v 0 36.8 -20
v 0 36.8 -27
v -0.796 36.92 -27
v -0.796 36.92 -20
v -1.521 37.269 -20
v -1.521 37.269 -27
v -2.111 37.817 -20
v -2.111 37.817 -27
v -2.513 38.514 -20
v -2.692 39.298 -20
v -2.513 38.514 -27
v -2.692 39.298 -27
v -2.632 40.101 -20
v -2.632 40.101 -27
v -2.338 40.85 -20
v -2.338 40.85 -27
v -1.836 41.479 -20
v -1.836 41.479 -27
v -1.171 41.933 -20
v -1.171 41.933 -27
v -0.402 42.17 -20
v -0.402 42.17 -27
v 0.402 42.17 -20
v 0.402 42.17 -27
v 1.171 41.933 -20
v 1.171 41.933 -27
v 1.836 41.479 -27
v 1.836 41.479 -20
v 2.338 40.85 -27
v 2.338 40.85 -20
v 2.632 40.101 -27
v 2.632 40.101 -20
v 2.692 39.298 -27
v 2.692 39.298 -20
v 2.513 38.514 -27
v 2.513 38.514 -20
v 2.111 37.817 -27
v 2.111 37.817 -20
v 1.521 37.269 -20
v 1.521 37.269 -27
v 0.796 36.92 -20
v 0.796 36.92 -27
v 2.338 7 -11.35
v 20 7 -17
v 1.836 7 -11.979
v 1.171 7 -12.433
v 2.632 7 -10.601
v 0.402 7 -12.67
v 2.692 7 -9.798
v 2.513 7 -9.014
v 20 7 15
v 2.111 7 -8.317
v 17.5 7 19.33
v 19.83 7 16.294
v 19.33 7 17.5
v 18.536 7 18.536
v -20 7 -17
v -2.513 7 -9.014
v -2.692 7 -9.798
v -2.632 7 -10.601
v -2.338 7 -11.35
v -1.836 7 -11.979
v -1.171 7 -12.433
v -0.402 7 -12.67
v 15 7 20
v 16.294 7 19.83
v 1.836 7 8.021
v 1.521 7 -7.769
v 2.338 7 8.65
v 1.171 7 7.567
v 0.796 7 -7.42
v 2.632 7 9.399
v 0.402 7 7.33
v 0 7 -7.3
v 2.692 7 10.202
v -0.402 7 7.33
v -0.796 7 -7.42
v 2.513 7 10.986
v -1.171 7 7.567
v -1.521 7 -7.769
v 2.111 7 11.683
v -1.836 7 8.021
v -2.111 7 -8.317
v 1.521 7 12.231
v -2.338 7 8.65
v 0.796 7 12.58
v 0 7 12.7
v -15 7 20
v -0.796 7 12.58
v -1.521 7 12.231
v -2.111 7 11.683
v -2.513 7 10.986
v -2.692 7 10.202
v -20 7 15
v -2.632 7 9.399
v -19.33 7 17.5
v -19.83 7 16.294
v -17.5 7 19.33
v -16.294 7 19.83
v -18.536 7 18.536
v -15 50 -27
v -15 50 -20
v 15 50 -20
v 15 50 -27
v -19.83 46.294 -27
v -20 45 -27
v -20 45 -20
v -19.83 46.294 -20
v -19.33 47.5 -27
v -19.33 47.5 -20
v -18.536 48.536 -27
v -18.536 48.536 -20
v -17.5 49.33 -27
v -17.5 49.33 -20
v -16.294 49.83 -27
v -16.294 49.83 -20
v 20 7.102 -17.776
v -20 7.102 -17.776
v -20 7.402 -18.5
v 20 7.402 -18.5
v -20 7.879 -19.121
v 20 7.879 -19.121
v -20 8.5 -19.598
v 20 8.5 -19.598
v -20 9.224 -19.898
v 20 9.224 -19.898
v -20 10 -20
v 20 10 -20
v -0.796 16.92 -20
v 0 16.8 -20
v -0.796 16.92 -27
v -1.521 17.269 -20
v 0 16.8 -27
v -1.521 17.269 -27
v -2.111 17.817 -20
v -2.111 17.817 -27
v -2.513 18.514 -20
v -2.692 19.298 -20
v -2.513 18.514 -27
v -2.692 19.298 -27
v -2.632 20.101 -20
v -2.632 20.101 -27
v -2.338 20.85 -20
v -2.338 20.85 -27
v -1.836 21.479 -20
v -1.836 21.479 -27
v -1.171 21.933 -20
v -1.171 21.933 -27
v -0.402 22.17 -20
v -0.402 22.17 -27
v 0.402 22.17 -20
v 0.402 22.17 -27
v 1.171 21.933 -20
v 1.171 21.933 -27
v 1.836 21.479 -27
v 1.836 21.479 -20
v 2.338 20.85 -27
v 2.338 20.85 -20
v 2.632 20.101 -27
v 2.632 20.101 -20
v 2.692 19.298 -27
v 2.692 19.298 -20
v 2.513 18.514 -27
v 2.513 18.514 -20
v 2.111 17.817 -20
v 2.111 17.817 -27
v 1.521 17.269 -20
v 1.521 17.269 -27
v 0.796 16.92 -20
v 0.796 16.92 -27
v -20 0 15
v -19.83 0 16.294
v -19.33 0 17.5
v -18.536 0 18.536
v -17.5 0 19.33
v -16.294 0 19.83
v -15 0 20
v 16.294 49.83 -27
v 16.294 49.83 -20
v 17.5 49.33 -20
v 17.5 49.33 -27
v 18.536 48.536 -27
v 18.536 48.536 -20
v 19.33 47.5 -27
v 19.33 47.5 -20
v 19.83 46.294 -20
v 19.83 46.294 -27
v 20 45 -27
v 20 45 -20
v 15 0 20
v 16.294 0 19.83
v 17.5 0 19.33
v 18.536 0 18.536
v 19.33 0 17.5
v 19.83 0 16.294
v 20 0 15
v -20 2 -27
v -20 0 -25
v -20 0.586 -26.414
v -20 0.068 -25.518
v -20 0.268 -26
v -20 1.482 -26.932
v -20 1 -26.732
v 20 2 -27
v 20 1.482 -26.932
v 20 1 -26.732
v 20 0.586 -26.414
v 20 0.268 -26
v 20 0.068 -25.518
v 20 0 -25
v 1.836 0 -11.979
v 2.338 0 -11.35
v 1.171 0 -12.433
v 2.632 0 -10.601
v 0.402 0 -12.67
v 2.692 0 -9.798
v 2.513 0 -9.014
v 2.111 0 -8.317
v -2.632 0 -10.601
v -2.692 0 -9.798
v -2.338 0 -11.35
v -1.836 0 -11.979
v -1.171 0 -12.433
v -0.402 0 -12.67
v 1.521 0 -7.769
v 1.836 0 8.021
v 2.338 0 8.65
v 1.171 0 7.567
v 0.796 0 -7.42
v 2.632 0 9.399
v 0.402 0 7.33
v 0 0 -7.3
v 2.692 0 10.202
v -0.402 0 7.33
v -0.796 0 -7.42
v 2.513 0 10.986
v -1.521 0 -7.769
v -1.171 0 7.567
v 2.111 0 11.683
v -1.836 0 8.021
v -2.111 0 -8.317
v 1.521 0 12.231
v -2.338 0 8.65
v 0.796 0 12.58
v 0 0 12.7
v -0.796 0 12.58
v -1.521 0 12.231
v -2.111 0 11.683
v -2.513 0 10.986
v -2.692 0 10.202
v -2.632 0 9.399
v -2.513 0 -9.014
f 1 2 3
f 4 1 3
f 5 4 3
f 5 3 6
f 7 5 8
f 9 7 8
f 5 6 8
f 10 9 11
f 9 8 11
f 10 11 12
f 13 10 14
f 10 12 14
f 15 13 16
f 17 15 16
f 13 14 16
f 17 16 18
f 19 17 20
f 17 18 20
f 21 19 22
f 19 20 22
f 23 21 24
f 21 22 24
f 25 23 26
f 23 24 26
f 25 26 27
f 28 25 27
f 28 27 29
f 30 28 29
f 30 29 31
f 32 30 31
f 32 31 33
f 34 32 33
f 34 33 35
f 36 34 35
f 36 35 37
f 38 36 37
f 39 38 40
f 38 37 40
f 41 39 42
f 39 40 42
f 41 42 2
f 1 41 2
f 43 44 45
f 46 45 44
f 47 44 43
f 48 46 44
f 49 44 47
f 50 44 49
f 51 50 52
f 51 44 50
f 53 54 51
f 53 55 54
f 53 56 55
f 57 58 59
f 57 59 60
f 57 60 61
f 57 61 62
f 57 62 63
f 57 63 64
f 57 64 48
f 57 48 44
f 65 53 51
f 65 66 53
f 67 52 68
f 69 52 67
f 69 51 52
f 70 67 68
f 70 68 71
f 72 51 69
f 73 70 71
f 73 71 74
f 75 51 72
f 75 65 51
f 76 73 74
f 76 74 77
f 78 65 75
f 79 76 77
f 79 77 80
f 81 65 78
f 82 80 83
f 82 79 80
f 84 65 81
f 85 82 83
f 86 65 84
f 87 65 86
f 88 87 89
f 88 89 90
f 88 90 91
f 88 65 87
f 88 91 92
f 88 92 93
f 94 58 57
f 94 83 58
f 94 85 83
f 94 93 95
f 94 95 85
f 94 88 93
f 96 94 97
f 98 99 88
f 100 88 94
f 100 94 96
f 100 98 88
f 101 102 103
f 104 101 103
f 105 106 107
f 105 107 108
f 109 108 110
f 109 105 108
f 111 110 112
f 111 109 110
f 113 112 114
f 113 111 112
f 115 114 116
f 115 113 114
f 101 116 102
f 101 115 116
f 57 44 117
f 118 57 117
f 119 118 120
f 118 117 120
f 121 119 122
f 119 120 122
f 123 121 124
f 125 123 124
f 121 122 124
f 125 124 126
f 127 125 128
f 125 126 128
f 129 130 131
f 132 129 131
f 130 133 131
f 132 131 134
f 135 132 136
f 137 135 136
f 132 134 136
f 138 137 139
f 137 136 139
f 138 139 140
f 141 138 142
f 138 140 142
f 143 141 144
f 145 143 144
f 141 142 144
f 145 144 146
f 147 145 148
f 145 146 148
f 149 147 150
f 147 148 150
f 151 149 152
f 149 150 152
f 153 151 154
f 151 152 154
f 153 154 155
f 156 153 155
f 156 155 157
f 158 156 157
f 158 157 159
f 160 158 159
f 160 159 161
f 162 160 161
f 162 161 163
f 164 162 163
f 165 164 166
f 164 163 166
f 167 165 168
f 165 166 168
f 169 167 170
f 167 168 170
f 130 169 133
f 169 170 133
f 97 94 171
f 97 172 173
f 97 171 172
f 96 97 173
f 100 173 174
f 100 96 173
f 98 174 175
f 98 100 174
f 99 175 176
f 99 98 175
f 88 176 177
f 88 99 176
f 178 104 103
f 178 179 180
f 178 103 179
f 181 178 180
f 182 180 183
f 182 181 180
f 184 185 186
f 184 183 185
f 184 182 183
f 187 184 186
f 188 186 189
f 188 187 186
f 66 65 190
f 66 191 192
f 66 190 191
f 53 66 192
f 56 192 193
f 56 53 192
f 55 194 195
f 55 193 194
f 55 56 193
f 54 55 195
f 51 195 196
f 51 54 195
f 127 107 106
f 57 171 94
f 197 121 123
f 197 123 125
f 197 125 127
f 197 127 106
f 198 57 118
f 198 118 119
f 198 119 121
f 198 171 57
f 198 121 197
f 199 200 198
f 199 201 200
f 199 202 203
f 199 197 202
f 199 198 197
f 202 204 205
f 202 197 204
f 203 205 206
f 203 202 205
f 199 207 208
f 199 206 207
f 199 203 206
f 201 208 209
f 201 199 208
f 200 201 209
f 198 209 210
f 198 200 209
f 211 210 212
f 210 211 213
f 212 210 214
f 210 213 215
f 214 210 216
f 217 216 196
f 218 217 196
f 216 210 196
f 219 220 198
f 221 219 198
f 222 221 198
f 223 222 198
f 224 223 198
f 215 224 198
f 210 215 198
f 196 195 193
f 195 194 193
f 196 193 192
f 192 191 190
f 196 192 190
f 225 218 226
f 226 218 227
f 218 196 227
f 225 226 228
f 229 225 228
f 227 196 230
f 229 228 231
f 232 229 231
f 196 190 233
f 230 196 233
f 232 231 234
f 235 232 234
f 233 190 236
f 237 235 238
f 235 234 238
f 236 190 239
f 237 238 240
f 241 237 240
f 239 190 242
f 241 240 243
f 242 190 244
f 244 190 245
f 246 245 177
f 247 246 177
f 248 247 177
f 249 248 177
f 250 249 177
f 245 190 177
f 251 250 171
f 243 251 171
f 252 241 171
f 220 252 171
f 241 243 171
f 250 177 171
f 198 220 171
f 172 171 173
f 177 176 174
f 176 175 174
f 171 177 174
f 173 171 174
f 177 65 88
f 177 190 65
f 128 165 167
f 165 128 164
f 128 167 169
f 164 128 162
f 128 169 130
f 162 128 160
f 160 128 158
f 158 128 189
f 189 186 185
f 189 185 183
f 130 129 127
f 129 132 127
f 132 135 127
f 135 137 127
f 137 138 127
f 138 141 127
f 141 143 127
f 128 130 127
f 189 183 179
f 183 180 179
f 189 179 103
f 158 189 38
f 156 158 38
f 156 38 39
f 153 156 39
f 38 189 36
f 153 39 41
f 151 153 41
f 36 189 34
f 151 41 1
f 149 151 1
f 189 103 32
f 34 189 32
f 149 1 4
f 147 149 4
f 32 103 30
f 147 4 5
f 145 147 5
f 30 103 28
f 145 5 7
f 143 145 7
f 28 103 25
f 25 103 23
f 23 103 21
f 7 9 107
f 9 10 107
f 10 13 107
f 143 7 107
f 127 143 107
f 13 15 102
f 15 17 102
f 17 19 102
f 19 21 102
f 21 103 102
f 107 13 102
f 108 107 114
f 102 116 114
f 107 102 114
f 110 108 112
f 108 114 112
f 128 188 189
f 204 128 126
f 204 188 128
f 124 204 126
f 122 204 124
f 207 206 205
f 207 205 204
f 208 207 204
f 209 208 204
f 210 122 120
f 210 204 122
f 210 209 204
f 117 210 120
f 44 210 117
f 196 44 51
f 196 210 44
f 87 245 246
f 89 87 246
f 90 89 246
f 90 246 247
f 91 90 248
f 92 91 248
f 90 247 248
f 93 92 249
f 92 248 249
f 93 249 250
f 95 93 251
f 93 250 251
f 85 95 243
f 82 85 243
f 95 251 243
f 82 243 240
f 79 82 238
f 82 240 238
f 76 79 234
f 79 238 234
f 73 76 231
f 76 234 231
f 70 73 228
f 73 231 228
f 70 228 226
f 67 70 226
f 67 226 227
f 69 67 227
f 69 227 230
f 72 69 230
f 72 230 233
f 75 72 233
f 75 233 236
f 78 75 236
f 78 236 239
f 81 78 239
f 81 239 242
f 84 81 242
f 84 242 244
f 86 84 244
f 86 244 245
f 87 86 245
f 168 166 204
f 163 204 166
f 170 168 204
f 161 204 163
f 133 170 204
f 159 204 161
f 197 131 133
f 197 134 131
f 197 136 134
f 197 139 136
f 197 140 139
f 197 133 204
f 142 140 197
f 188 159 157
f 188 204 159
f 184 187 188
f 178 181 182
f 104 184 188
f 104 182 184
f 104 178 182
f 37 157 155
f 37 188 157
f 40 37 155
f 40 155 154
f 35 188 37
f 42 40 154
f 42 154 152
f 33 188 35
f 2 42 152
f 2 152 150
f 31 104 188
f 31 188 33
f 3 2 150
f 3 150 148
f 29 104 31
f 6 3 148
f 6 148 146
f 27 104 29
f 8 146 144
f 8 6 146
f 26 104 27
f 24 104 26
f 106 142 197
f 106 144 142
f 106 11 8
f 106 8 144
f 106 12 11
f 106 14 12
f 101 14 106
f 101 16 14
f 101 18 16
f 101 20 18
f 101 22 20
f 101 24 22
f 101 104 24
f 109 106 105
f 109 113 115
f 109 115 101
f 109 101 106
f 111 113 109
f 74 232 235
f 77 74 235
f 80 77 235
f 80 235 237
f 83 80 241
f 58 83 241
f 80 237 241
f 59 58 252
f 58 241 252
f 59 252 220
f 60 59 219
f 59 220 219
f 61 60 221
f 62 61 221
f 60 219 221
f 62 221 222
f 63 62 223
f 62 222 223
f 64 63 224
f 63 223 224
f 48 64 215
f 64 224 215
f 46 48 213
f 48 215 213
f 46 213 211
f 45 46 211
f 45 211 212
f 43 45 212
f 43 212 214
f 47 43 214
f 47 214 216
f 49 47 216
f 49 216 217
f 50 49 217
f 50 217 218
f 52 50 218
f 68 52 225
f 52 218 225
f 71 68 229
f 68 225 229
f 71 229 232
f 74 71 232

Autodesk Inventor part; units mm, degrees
ref_plane "YZ Plane" through (0, 0, 0) normal (1, 0, 0) x (0, 1, 0)
ref_plane "XZ Plane" through (0, 0, 0) normal (0, 1, 0) x (-1, 0, 0)
ref_plane "XY Plane" through (0, 0, 0) normal (0, 0, 1) x (1, 0, 0)
sketch "Sketch1" plane through (0, 0, 0) normal (0, 1, 0) x (-1, 0, 0)
  line L0 (20, -20) -> (-20, -20)
  line L1 (-20, -20) -> (-20, 20)
  line L2 (-20, 20) -> (20, 20)
  line L3 (20, 20) -> (20, -20)
  line L4 (20, -20) -> (-20, 20) construction
  line L5 (-20, -20) -> (20, 20) construction
  point P0 (0, 0)
  dimension "d0" = 40
  dimension "d1" = 40
extrude "Extrusion1" add sketch "Sketch1" along normal blind 7
sketch "Sketch2" plane through (0, 7, 0) normal (0, 1, 0) x (1, 0, 0)
  line L0 (-20, -20) -> (20, -20) projected
  point P0 (0, 0)
  point P1 (0, -10)
  point P2 (0, 10)
  dimension "d4" = 20
  dimension "d5" = 10
sketch "Sketch3" plane through (20, 0, -20) normal (0, 0, -1) x (-1, 0, 0)
  line L0 (0, 0) -> (0, 7) projected
  line L1 (0, 0) -> (40, 0)
  line L2 (40, 0) -> (40, 50)
  line L3 (40, 50) -> (0, 50)
  line L4 (0, 50) -> (0, 0)
  point P0 (20, 0)
  dimension "d14" = 50
  dimension "d15" = 40
extrude "Extrusion2" add sketch "Sketch3" along normal blind 7
fillet "Fillet2" radius 3 1 edges at (0, 7, -20)
fillet "Fillet2" radius 5 4 edges at (-20, 50, -23.5) (20, 50, -23.5) (-20, 3.5, 20) (20, 3.5, 20)
fillet "Fillet2" radius 2 1 edges at (0, 0, -27)
sketch "Sketch4" plane through (20, 0, -20) normal (0, 0, 1) x (1, 0, 0)
  line L0 (-35, 0) -> (-5, 0) projected
  line L1 (-40, 7) -> (0, 7) projected
  point P0 (-20, 0)
  point P1 (-20, 39.5)
  point P2 (-20, 19.5)
  point P3 (-20, 0)
  point P4 (-20, 0)
  dimension "d22" = 20
  dimension "d23" = 12.5
hole "Hole4" at (0, 39.5, -20) at (0, 19.5, -20) direction (0, 0, -1) diameter 5.4 end through all
hole "Hole5" at (0, 7, 10) at (0, 7, -10) direction (0, -1, 0) diameter 5.4 end through all
properties part number "angulares"
